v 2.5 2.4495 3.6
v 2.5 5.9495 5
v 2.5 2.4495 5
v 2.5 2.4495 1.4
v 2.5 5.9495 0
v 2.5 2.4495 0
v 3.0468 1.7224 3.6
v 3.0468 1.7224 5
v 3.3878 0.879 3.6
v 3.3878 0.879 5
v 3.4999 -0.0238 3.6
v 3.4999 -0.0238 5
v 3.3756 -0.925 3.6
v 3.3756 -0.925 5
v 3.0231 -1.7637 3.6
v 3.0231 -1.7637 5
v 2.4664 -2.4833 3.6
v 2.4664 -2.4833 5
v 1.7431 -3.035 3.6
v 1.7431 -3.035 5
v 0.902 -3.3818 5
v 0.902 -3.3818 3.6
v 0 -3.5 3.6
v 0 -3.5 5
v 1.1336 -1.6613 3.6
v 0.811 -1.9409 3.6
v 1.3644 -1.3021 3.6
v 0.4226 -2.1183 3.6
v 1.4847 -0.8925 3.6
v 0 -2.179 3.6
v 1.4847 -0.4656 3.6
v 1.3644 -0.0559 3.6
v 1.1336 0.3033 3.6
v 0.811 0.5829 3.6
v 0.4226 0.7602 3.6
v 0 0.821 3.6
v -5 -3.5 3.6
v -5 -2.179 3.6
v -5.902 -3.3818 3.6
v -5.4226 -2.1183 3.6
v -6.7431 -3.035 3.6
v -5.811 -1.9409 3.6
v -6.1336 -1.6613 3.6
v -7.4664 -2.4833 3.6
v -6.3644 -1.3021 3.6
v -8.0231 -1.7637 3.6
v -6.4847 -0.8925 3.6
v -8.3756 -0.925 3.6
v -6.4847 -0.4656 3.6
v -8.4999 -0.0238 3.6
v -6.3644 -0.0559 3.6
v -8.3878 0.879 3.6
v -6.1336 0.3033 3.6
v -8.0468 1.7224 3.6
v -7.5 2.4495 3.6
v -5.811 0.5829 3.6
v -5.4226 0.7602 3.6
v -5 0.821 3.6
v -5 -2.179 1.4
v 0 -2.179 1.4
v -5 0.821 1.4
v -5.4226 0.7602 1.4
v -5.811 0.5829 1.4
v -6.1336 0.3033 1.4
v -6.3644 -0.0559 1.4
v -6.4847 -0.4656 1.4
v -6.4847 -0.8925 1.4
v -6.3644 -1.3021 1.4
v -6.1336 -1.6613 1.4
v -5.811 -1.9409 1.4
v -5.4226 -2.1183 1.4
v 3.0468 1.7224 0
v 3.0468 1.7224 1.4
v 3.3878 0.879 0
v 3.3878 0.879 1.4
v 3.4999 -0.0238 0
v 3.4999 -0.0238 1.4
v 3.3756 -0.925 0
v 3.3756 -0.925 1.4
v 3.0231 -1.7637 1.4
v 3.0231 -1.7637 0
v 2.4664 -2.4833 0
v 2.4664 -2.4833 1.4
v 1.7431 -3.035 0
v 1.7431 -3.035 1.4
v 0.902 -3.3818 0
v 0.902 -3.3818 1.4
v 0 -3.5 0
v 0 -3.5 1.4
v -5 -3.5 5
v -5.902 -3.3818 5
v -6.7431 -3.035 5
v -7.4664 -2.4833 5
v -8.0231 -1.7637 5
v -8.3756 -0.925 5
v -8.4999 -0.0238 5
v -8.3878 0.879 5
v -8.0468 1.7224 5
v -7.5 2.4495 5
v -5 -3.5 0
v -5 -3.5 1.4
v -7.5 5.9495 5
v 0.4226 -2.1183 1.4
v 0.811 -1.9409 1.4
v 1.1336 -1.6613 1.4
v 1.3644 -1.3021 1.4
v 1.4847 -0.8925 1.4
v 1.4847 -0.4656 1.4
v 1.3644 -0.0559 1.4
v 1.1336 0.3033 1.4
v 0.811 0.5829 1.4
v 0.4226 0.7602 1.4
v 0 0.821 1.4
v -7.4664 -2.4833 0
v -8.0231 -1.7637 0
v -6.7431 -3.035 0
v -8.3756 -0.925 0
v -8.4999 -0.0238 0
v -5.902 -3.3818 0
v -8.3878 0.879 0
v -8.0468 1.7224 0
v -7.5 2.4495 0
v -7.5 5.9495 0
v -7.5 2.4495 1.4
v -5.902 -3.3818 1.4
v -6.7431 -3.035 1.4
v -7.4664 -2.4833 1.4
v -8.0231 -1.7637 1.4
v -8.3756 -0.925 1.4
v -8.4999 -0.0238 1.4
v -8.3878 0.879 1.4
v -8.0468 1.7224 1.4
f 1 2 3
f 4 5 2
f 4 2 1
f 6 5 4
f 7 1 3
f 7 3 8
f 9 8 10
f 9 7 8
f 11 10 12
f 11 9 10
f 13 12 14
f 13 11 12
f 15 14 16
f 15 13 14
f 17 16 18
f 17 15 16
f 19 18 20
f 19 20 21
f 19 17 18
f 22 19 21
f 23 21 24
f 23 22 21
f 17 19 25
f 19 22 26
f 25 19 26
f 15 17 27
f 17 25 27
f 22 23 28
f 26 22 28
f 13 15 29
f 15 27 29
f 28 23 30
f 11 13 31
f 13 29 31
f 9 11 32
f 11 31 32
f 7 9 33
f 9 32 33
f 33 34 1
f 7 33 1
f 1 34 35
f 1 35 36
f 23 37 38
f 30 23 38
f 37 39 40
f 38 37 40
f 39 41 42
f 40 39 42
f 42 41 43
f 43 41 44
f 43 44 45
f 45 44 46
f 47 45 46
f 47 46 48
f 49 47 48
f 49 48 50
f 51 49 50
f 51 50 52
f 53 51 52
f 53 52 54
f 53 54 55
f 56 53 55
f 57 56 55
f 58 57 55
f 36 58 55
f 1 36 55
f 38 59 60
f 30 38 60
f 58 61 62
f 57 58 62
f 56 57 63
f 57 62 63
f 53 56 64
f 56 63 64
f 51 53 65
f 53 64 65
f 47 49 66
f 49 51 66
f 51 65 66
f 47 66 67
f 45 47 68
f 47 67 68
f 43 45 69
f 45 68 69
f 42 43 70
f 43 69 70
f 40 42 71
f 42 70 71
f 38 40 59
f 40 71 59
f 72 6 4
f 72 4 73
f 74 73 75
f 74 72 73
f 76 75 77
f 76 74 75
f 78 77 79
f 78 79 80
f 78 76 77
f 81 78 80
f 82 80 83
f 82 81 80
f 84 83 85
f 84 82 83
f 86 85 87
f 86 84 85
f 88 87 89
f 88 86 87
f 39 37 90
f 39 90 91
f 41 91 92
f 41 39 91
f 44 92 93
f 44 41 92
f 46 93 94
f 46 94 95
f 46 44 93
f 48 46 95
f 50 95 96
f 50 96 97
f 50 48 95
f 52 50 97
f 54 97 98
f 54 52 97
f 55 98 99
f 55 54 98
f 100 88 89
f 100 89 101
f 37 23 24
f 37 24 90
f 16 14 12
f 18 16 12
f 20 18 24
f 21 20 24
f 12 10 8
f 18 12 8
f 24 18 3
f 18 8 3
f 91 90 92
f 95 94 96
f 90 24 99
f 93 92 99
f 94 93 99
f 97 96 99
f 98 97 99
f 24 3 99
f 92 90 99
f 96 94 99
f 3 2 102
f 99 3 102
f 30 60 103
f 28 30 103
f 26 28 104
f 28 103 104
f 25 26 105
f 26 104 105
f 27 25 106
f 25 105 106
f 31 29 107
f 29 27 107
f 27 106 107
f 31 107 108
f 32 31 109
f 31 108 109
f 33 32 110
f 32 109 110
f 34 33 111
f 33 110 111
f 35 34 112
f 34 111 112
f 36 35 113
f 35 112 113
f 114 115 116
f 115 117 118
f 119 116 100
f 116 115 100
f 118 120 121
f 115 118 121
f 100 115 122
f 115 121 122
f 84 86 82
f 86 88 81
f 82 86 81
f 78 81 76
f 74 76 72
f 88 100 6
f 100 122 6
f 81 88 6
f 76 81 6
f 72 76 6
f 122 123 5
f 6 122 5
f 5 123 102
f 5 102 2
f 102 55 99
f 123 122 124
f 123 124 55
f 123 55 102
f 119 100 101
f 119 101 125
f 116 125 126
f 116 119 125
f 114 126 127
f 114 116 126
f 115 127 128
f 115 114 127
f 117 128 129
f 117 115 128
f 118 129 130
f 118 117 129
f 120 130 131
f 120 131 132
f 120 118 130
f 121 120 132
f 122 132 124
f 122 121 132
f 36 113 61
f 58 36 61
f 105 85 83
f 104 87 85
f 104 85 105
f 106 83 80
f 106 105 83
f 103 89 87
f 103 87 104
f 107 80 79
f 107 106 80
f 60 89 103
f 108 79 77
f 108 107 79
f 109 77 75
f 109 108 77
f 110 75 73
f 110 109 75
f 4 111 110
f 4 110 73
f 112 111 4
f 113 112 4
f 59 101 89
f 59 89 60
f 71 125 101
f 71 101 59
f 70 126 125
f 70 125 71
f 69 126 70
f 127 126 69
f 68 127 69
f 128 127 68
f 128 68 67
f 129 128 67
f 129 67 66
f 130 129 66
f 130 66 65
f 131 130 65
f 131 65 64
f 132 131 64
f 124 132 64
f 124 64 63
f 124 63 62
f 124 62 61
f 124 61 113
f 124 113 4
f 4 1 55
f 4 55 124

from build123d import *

# Parameters (mm, degrees)
BOSS_EXTRUDE1_DEPTH     = 5
CUT_EXTRUDE1_DEPTH      = 12.517223111
CUT_EXTRUDE1_DEPTH_BACK = 12.517223111
SKETCH2_W               = 2.2
SKETCH2_H               = 5.949489743
BOSS_EXTRUDE2_DEPTH     = 5


with BuildPart() as part:
    # Sketch1 → Boss-Extrude1 (new body)
    with BuildSketch(Plane.XY):
        with BuildLine():
            Line((-7.5, 5.949489743), (2.5, 5.949489743))
            Line((2.5, 5.949489743), (2.5, 2.449489743))
            ThreePointArc((2.5, 2.449489743), (3.226702194, -1.355873501), (0, -3.5))
            Line((0, -3.5), (-5, -3.5))
            ThreePointArc((-5, -3.5), (-8.226702194, -1.355873501), (-7.5, 2.449489743))
            Line((-7.5, 2.449489743), (-7.5, 5.949489743))
        make_face()
    extrude(amount=BOSS_EXTRUDE1_DEPTH)

    # Sketch2 → Cut-Extrude1 (cut, two sides: drawn at the far end of the back side and taken through both)
    with BuildSketch(Plane(origin=(0, 0, 0), x_dir=(0, 0, -1), z_dir=(1, 0, 0)).offset(-CUT_EXTRUDE1_DEPTH_BACK)):
        with Locations((-2.5, -0.525255129)):
            Rectangle(SKETCH2_W, SKETCH2_H)
    extrude(amount=CUT_EXTRUDE1_DEPTH + CUT_EXTRUDE1_DEPTH_BACK, mode=Mode.SUBTRACT)

    # Sketch3 → Boss-Extrude2 (add)
    with BuildSketch(Plane.XY):
        with BuildLine():
            Line((-5, -2.179025152), (0, -2.179025152))
            ThreePointArc((0, -2.179025152), (1.5, -0.679025152), (0, 0.820974848))
            Line((0, 0.820974848), (-5, 0.820974848))
            ThreePointArc((-5, 0.820974848), (-6.5, -0.679025152), (-5, -2.179025152))
        make_face()
    extrude(amount=BOSS_EXTRUDE2_DEPTH)


solid = part.part
